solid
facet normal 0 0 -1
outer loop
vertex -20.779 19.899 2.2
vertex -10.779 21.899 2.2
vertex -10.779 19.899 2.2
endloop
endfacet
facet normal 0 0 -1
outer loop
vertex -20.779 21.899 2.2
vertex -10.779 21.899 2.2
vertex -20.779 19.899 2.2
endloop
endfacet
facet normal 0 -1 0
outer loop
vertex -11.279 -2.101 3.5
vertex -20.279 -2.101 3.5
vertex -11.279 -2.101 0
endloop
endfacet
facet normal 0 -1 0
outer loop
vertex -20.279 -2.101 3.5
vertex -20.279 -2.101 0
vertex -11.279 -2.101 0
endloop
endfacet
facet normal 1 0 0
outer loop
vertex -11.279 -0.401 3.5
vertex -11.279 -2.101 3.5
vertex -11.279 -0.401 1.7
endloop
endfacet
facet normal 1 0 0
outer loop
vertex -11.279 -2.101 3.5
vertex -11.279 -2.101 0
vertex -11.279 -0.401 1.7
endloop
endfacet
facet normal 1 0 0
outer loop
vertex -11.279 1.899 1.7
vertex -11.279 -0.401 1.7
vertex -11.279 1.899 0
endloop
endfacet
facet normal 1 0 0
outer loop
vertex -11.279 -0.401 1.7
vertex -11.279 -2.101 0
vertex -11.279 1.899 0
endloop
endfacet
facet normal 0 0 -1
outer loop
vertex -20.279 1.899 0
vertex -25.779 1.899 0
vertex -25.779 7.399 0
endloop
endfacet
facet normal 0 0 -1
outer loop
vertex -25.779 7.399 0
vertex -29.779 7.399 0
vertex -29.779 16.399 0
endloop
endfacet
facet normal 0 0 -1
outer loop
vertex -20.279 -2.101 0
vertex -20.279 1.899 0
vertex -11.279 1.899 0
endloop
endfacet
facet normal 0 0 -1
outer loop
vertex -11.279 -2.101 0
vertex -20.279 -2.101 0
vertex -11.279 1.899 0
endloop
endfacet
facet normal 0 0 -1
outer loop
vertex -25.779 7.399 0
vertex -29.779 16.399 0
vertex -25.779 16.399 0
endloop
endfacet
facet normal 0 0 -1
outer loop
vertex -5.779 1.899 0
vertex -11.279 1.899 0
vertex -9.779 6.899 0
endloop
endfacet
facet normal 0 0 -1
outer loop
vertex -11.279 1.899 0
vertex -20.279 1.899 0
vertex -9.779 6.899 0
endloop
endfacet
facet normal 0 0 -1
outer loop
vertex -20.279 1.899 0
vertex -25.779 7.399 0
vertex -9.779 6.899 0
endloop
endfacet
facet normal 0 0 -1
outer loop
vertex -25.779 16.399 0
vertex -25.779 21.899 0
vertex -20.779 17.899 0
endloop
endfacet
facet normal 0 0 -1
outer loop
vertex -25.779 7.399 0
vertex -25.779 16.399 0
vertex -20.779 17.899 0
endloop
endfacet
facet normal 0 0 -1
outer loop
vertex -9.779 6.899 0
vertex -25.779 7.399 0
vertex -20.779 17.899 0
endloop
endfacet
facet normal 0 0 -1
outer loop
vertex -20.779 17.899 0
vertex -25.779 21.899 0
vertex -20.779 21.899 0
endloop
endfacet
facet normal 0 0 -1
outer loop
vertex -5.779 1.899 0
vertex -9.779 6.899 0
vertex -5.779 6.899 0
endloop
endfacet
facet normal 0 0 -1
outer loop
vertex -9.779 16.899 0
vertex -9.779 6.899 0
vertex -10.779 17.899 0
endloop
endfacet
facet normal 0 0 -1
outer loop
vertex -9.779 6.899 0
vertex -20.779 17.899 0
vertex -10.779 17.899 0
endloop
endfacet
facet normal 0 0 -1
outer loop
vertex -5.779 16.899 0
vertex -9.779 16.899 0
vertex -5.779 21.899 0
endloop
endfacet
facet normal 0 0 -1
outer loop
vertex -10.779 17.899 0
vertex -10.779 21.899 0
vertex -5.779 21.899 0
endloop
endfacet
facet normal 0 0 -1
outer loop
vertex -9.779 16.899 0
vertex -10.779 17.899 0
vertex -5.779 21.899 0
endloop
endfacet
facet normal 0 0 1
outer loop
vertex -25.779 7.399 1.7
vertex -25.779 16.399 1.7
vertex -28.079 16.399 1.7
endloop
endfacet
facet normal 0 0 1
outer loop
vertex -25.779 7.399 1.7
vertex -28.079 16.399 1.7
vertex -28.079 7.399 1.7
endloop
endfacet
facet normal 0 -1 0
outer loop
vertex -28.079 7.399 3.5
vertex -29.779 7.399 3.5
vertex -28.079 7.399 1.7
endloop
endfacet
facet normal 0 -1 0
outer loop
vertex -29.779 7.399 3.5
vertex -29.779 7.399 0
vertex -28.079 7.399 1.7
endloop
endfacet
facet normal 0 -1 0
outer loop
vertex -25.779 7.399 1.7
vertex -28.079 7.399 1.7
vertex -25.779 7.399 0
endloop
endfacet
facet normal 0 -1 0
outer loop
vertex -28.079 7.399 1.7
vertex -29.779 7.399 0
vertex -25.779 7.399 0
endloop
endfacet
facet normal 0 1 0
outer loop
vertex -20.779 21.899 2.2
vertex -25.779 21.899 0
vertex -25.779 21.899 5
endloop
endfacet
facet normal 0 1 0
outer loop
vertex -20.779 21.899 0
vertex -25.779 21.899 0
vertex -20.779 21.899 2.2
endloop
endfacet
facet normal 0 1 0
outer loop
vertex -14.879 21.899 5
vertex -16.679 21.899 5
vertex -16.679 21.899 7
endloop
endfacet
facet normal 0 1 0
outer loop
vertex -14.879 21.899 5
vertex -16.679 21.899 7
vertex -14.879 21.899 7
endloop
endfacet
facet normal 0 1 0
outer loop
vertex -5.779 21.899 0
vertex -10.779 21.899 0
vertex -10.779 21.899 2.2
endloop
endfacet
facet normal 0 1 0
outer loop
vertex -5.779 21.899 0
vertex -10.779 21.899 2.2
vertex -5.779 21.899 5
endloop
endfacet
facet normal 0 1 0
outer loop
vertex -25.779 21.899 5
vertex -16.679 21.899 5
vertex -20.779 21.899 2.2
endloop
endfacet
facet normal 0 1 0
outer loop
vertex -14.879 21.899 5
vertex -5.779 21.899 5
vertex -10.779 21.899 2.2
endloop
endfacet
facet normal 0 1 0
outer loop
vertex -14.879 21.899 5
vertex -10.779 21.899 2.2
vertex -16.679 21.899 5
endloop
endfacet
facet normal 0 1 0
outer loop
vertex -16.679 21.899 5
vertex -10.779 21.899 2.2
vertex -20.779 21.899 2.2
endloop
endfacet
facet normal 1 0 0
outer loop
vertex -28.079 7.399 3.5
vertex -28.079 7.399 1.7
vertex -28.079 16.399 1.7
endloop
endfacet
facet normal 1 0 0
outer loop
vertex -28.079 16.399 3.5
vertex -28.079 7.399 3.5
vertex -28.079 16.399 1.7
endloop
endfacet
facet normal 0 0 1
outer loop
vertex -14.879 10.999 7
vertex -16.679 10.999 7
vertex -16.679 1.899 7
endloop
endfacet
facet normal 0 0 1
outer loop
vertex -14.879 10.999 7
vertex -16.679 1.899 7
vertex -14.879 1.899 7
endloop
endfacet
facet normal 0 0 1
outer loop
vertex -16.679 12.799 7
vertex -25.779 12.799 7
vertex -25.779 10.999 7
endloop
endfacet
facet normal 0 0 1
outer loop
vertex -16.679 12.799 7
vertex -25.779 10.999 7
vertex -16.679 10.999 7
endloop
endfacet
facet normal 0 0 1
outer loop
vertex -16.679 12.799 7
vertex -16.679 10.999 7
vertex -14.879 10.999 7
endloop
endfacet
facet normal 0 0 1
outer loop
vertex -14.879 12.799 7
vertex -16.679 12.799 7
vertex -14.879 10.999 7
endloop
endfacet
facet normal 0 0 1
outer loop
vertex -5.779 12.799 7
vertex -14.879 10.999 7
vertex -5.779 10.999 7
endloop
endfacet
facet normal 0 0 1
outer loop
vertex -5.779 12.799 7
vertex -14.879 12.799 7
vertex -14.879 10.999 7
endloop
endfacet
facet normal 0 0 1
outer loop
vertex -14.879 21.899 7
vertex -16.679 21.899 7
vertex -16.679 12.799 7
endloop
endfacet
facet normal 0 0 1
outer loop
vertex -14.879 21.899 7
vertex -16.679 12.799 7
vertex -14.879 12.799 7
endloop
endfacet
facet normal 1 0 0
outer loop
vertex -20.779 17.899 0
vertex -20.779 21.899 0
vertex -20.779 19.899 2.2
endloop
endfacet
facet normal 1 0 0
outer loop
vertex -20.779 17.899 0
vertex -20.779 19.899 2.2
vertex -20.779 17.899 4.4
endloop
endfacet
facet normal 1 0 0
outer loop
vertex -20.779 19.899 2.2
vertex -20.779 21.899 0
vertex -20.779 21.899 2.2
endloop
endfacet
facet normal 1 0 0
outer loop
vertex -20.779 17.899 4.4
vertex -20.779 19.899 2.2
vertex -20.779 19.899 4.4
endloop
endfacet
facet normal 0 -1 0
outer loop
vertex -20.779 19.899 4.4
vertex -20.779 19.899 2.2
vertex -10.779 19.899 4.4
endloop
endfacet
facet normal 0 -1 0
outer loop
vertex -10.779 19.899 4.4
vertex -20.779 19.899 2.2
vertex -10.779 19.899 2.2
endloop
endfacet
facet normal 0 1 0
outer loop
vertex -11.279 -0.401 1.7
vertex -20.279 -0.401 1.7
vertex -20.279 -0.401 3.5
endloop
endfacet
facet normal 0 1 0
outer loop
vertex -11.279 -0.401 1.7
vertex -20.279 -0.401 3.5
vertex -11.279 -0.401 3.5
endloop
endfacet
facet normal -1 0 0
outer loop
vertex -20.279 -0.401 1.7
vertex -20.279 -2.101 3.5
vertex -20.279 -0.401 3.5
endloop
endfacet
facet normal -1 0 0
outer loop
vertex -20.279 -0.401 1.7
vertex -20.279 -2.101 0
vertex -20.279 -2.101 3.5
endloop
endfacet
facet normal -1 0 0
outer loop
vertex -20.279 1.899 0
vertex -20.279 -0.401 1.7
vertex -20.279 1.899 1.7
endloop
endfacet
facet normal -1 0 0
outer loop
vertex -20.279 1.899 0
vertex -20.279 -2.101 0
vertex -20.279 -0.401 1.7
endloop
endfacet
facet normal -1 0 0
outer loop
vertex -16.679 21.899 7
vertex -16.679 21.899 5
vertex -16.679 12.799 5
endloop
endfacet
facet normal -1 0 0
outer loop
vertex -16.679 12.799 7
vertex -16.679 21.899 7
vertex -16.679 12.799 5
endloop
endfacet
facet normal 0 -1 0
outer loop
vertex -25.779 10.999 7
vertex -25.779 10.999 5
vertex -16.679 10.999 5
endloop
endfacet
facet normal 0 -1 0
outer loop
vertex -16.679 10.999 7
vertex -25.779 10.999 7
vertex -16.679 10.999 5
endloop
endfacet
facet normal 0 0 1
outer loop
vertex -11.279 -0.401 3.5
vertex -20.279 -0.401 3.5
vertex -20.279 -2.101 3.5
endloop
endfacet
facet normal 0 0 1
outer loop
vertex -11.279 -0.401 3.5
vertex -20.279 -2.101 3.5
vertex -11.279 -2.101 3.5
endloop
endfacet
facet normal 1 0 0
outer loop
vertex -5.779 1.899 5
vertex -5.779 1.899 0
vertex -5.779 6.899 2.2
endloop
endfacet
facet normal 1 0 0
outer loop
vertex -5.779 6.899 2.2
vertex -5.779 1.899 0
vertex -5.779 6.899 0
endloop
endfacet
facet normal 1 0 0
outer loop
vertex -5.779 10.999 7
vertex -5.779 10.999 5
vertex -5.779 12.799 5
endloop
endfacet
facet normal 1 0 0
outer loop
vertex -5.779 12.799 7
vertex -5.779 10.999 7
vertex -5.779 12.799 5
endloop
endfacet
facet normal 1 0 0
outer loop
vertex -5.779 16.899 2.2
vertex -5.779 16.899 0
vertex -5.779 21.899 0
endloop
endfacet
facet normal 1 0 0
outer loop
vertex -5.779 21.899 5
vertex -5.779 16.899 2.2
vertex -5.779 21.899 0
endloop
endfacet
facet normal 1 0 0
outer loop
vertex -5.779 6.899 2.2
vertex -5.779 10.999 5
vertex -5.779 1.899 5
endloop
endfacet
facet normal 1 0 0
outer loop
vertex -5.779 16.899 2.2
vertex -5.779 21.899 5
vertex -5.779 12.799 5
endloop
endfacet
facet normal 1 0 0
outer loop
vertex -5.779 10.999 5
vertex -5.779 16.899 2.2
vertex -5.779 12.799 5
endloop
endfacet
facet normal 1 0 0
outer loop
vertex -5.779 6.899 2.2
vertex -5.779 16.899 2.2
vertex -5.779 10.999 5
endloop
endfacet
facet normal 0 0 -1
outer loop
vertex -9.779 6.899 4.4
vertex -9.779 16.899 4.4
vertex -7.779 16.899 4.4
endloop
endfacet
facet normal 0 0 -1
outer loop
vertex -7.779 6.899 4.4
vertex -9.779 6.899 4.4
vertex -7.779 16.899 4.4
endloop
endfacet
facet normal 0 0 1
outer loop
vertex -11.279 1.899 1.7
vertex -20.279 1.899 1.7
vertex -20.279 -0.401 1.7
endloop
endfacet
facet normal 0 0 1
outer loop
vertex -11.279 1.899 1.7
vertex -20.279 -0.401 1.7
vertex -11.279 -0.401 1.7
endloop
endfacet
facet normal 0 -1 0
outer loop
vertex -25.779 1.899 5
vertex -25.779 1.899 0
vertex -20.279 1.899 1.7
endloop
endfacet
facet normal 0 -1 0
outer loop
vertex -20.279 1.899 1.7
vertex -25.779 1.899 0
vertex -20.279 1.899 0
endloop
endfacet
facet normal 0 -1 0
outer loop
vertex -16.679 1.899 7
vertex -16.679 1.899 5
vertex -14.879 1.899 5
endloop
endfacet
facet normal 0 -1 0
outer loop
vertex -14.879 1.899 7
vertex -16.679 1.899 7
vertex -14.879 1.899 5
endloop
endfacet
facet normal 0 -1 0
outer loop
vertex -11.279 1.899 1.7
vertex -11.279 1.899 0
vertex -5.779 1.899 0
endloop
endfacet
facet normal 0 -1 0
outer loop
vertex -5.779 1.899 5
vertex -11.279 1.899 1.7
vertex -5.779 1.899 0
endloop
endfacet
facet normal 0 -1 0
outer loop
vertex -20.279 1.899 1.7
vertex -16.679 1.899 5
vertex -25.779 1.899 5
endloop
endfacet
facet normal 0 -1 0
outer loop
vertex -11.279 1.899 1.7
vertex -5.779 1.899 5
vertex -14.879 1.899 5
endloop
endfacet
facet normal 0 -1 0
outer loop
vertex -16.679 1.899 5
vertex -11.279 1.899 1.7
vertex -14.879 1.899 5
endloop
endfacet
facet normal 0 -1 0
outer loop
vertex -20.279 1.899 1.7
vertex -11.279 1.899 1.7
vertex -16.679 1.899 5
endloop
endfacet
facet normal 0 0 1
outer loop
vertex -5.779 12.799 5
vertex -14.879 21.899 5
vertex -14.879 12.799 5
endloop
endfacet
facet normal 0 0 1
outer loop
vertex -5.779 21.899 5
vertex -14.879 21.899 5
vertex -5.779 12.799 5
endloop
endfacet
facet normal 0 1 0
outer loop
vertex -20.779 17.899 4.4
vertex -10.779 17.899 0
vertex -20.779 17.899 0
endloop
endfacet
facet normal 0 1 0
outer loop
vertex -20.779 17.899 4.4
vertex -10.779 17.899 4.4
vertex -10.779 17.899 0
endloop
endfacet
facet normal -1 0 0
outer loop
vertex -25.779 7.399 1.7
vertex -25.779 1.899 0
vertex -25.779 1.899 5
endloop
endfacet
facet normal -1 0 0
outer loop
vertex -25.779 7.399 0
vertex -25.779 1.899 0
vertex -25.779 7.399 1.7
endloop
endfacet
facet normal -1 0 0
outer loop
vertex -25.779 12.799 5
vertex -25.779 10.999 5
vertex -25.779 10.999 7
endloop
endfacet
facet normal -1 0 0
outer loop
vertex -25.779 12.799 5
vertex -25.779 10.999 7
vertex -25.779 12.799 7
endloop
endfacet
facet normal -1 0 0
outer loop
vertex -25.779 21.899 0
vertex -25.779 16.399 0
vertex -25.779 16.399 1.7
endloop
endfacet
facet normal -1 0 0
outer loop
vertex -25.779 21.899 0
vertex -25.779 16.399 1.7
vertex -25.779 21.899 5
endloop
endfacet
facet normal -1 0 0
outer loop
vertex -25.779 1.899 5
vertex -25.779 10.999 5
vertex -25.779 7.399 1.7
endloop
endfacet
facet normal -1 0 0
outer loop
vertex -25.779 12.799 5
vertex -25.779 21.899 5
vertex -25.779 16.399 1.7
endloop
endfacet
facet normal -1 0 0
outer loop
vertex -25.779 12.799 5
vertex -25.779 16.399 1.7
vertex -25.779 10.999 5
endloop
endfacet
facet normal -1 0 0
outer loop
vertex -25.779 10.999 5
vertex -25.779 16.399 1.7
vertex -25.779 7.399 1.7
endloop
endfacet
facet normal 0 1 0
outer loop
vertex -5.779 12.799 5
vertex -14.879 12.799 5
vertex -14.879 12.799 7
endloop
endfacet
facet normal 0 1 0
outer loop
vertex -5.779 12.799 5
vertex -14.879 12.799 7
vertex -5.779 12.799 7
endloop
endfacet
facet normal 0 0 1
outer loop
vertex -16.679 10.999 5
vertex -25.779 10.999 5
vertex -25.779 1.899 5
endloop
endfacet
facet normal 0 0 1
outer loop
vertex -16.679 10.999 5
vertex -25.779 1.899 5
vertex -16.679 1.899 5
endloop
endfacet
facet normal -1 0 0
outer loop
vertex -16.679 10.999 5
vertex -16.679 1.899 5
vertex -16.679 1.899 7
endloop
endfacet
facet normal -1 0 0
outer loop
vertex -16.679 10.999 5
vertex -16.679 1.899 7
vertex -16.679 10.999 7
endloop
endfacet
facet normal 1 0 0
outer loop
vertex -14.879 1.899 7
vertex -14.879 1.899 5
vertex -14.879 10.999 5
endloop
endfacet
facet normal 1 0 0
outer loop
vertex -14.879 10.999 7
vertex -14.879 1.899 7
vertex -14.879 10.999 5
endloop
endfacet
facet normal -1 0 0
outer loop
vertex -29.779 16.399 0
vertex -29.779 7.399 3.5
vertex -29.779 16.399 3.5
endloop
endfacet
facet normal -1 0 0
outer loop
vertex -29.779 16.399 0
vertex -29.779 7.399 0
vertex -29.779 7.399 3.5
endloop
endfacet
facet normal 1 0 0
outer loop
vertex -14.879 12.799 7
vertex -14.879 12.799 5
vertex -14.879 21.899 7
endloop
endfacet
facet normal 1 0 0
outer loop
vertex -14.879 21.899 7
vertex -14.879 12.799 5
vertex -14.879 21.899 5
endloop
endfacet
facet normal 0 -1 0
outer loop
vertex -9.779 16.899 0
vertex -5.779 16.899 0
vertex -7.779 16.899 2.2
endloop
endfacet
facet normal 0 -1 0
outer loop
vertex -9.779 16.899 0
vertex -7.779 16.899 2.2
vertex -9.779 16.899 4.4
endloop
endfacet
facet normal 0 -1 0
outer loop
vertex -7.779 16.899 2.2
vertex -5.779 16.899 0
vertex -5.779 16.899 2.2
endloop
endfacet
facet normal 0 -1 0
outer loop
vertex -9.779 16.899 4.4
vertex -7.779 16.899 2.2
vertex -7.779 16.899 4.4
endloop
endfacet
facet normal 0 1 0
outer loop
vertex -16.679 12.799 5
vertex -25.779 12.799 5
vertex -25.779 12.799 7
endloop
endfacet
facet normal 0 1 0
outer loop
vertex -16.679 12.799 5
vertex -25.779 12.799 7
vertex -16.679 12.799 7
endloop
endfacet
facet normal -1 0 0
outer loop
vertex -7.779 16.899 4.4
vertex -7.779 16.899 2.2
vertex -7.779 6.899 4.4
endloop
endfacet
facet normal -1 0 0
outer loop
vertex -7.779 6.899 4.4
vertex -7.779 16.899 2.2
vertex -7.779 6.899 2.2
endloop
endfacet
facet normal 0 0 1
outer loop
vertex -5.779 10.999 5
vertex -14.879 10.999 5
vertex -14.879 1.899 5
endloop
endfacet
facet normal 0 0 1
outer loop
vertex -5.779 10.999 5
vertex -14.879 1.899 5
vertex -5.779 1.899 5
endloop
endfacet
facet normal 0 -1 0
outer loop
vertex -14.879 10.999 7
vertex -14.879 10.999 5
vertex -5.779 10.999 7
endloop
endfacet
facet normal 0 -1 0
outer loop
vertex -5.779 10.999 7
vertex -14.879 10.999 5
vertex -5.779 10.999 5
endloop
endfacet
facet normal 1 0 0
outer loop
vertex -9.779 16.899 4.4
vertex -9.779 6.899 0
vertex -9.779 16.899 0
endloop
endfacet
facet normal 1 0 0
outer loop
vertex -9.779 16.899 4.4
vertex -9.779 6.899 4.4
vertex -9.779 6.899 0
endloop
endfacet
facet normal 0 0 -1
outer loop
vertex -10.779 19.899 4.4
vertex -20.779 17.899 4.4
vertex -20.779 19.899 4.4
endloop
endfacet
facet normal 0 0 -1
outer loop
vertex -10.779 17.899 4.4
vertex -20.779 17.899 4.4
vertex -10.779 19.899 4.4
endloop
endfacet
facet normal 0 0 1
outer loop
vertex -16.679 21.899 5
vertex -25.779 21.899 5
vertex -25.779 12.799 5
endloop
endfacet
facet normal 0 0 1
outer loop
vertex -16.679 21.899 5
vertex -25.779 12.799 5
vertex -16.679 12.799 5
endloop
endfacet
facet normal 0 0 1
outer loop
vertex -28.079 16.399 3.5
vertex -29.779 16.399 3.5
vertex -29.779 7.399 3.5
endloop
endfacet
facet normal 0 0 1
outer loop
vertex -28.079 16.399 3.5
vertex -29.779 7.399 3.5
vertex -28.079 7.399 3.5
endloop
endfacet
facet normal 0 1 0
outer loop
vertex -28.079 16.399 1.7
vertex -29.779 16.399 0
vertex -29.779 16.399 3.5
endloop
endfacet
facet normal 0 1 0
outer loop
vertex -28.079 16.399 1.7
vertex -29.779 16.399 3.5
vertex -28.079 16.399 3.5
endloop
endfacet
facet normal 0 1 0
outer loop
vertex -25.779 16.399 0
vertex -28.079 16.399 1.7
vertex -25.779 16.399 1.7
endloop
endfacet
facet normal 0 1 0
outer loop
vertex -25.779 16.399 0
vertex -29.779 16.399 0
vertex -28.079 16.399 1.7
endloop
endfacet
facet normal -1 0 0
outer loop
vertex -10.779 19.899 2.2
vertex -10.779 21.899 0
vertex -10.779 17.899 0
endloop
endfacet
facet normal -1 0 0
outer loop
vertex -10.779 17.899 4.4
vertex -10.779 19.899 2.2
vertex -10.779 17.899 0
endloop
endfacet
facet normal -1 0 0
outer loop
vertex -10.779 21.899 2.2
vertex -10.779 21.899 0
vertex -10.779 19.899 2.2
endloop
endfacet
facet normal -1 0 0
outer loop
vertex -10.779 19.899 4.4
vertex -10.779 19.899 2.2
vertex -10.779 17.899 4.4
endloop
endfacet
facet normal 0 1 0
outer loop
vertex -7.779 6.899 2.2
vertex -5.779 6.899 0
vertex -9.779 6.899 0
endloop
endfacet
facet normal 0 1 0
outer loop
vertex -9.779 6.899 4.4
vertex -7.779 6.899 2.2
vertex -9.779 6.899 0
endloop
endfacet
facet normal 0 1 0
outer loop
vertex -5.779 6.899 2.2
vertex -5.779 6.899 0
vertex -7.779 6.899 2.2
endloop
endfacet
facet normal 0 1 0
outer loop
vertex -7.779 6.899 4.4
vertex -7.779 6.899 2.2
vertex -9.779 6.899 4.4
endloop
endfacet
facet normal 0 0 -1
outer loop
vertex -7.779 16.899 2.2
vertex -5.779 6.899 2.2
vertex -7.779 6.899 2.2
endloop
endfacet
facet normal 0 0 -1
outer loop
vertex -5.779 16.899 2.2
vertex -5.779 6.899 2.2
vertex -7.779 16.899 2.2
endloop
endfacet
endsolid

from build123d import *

# Parameters (mm, degrees)
F0_W      = 20
F0_H      = 20
F1_DEPTH  = 5
F2_W      = 1.8
F2_H      = 9.1
F2_H_2    = 1.8
F2_W_2    = 9.1
F3_DEPTH  = 2
F4_W      = 9
F4_H      = 1.7
F5_DEPTH  = 4
F6_W      = 9
F6_H      = 1.7
F7_DEPTH  = 4
F8_W      = 10
F8_H      = 2.2
F9_DEPTH  = 4
F10_W     = 10
F10_H     = 2.2
F11_DEPTH = 4
F12_W     = 2
F12_H     = 10
F13_DEPTH = 2.2
F14_W     = 10
F14_H     = 2
F15_DEPTH = 2.2
F16_W     = 9
F16_H     = 1.7
F17_DEPTH = 1.8
F18_W     = 1.7
F18_H     = 9
F19_DEPTH = 1.8


with BuildPart() as f1:
    # F0 (on Top) → F1 (new body)
    with BuildSketch(Plane.XY):
        with Locations((-15.7790486701, 11.8990262393)):
            Rectangle(F0_W, F0_H)
    extrude(amount=F1_DEPTH)

    # F2 (on face) → F3 (join)
    with BuildSketch(Plane.XY.offset(5)):
        with Locations((-15.7790486701, 17.3490262393)):
            Rectangle(F2_W, F2_H)
        with Locations((-15.7790486701, 11.8990262393)):
            Rectangle(F2_W, F2_H_2)
        with Locations((-21.2290486701, 11.8990262393)):
            Rectangle(F2_W_2, F2_H_2)
        with Locations((-10.3290486701, 11.8990262393)):
            Rectangle(F2_W_2, F2_H_2)
        with Locations((-15.7790486701, 6.4490262393)):
            Rectangle(F2_W, F2_H)
    extrude(amount=F3_DEPTH)

    # F4 (on face) → F5 (join)
    with BuildSketch(Plane.XZ.offset(-1.8990262393)):
        with Locations((-15.7790486701, 0.85)):
            Rectangle(F4_W, F4_H)
    extrude(amount=F5_DEPTH)

    # F6 (on face) → F7 (join)
    with BuildSketch(Plane(origin=(-25.7790486701, 0, 0), x_dir=(0, -1, 0), z_dir=(-1, 0, 0))):
        with Locations((-11.8990262393, 0.85)):
            Rectangle(F6_W, F6_H)
    extrude(amount=F7_DEPTH)

    # F8 (on face) → F9 (cut)
    with BuildSketch(Plane(origin=(0, 21.8990262393, 0), x_dir=(-1, 0, 0), z_dir=(0, 1, 0))):
        with Locations((15.7790486701, 1.1)):
            Rectangle(F8_W, F8_H)
    extrude(amount=-F9_DEPTH, mode=Mode.SUBTRACT)

    # F10 (on face) → F11 (cut)
    with BuildSketch(Plane.YZ.offset(-5.7790486701)):
        with Locations((11.8990262393, 1.1)):
            Rectangle(F10_W, F10_H)
    extrude(amount=-F11_DEPTH, mode=Mode.SUBTRACT)

    # F12 (on face) → F13 (cut)
    with BuildSketch(Plane(origin=(0, 0, 2.2), x_dir=(1, 0, 0), z_dir=(0, 0, -1))):
        with Locations((-8.7790486701, -11.8990262393)):
            Rectangle(F12_W, F12_H)
    extrude(amount=-F13_DEPTH, mode=Mode.SUBTRACT)

    # F14 (on face) → F15 (cut)
    with BuildSketch(Plane(origin=(0, 0, 2.2), x_dir=(1, 0, 0), z_dir=(0, 0, -1))):
        with Locations((-15.7790486701, -18.8990262393)):
            Rectangle(F14_W, F14_H)
    extrude(amount=-F15_DEPTH, mode=Mode.SUBTRACT)

    # F16 (on face) → F17 (join)
    with BuildSketch(Plane.XY.offset(1.7)):
        with Locations((-15.7790486701, -1.2509737607)):
            Rectangle(F16_W, F16_H)
    extrude(amount=F17_DEPTH)

    # F18 (on face) → F19 (join)
    with BuildSketch(Plane.XY.offset(1.7)):
        with Locations((-28.9290486701, 11.8990262393)):
            Rectangle(F18_W, F18_H)
    extrude(amount=F19_DEPTH)


solid = f1.part
